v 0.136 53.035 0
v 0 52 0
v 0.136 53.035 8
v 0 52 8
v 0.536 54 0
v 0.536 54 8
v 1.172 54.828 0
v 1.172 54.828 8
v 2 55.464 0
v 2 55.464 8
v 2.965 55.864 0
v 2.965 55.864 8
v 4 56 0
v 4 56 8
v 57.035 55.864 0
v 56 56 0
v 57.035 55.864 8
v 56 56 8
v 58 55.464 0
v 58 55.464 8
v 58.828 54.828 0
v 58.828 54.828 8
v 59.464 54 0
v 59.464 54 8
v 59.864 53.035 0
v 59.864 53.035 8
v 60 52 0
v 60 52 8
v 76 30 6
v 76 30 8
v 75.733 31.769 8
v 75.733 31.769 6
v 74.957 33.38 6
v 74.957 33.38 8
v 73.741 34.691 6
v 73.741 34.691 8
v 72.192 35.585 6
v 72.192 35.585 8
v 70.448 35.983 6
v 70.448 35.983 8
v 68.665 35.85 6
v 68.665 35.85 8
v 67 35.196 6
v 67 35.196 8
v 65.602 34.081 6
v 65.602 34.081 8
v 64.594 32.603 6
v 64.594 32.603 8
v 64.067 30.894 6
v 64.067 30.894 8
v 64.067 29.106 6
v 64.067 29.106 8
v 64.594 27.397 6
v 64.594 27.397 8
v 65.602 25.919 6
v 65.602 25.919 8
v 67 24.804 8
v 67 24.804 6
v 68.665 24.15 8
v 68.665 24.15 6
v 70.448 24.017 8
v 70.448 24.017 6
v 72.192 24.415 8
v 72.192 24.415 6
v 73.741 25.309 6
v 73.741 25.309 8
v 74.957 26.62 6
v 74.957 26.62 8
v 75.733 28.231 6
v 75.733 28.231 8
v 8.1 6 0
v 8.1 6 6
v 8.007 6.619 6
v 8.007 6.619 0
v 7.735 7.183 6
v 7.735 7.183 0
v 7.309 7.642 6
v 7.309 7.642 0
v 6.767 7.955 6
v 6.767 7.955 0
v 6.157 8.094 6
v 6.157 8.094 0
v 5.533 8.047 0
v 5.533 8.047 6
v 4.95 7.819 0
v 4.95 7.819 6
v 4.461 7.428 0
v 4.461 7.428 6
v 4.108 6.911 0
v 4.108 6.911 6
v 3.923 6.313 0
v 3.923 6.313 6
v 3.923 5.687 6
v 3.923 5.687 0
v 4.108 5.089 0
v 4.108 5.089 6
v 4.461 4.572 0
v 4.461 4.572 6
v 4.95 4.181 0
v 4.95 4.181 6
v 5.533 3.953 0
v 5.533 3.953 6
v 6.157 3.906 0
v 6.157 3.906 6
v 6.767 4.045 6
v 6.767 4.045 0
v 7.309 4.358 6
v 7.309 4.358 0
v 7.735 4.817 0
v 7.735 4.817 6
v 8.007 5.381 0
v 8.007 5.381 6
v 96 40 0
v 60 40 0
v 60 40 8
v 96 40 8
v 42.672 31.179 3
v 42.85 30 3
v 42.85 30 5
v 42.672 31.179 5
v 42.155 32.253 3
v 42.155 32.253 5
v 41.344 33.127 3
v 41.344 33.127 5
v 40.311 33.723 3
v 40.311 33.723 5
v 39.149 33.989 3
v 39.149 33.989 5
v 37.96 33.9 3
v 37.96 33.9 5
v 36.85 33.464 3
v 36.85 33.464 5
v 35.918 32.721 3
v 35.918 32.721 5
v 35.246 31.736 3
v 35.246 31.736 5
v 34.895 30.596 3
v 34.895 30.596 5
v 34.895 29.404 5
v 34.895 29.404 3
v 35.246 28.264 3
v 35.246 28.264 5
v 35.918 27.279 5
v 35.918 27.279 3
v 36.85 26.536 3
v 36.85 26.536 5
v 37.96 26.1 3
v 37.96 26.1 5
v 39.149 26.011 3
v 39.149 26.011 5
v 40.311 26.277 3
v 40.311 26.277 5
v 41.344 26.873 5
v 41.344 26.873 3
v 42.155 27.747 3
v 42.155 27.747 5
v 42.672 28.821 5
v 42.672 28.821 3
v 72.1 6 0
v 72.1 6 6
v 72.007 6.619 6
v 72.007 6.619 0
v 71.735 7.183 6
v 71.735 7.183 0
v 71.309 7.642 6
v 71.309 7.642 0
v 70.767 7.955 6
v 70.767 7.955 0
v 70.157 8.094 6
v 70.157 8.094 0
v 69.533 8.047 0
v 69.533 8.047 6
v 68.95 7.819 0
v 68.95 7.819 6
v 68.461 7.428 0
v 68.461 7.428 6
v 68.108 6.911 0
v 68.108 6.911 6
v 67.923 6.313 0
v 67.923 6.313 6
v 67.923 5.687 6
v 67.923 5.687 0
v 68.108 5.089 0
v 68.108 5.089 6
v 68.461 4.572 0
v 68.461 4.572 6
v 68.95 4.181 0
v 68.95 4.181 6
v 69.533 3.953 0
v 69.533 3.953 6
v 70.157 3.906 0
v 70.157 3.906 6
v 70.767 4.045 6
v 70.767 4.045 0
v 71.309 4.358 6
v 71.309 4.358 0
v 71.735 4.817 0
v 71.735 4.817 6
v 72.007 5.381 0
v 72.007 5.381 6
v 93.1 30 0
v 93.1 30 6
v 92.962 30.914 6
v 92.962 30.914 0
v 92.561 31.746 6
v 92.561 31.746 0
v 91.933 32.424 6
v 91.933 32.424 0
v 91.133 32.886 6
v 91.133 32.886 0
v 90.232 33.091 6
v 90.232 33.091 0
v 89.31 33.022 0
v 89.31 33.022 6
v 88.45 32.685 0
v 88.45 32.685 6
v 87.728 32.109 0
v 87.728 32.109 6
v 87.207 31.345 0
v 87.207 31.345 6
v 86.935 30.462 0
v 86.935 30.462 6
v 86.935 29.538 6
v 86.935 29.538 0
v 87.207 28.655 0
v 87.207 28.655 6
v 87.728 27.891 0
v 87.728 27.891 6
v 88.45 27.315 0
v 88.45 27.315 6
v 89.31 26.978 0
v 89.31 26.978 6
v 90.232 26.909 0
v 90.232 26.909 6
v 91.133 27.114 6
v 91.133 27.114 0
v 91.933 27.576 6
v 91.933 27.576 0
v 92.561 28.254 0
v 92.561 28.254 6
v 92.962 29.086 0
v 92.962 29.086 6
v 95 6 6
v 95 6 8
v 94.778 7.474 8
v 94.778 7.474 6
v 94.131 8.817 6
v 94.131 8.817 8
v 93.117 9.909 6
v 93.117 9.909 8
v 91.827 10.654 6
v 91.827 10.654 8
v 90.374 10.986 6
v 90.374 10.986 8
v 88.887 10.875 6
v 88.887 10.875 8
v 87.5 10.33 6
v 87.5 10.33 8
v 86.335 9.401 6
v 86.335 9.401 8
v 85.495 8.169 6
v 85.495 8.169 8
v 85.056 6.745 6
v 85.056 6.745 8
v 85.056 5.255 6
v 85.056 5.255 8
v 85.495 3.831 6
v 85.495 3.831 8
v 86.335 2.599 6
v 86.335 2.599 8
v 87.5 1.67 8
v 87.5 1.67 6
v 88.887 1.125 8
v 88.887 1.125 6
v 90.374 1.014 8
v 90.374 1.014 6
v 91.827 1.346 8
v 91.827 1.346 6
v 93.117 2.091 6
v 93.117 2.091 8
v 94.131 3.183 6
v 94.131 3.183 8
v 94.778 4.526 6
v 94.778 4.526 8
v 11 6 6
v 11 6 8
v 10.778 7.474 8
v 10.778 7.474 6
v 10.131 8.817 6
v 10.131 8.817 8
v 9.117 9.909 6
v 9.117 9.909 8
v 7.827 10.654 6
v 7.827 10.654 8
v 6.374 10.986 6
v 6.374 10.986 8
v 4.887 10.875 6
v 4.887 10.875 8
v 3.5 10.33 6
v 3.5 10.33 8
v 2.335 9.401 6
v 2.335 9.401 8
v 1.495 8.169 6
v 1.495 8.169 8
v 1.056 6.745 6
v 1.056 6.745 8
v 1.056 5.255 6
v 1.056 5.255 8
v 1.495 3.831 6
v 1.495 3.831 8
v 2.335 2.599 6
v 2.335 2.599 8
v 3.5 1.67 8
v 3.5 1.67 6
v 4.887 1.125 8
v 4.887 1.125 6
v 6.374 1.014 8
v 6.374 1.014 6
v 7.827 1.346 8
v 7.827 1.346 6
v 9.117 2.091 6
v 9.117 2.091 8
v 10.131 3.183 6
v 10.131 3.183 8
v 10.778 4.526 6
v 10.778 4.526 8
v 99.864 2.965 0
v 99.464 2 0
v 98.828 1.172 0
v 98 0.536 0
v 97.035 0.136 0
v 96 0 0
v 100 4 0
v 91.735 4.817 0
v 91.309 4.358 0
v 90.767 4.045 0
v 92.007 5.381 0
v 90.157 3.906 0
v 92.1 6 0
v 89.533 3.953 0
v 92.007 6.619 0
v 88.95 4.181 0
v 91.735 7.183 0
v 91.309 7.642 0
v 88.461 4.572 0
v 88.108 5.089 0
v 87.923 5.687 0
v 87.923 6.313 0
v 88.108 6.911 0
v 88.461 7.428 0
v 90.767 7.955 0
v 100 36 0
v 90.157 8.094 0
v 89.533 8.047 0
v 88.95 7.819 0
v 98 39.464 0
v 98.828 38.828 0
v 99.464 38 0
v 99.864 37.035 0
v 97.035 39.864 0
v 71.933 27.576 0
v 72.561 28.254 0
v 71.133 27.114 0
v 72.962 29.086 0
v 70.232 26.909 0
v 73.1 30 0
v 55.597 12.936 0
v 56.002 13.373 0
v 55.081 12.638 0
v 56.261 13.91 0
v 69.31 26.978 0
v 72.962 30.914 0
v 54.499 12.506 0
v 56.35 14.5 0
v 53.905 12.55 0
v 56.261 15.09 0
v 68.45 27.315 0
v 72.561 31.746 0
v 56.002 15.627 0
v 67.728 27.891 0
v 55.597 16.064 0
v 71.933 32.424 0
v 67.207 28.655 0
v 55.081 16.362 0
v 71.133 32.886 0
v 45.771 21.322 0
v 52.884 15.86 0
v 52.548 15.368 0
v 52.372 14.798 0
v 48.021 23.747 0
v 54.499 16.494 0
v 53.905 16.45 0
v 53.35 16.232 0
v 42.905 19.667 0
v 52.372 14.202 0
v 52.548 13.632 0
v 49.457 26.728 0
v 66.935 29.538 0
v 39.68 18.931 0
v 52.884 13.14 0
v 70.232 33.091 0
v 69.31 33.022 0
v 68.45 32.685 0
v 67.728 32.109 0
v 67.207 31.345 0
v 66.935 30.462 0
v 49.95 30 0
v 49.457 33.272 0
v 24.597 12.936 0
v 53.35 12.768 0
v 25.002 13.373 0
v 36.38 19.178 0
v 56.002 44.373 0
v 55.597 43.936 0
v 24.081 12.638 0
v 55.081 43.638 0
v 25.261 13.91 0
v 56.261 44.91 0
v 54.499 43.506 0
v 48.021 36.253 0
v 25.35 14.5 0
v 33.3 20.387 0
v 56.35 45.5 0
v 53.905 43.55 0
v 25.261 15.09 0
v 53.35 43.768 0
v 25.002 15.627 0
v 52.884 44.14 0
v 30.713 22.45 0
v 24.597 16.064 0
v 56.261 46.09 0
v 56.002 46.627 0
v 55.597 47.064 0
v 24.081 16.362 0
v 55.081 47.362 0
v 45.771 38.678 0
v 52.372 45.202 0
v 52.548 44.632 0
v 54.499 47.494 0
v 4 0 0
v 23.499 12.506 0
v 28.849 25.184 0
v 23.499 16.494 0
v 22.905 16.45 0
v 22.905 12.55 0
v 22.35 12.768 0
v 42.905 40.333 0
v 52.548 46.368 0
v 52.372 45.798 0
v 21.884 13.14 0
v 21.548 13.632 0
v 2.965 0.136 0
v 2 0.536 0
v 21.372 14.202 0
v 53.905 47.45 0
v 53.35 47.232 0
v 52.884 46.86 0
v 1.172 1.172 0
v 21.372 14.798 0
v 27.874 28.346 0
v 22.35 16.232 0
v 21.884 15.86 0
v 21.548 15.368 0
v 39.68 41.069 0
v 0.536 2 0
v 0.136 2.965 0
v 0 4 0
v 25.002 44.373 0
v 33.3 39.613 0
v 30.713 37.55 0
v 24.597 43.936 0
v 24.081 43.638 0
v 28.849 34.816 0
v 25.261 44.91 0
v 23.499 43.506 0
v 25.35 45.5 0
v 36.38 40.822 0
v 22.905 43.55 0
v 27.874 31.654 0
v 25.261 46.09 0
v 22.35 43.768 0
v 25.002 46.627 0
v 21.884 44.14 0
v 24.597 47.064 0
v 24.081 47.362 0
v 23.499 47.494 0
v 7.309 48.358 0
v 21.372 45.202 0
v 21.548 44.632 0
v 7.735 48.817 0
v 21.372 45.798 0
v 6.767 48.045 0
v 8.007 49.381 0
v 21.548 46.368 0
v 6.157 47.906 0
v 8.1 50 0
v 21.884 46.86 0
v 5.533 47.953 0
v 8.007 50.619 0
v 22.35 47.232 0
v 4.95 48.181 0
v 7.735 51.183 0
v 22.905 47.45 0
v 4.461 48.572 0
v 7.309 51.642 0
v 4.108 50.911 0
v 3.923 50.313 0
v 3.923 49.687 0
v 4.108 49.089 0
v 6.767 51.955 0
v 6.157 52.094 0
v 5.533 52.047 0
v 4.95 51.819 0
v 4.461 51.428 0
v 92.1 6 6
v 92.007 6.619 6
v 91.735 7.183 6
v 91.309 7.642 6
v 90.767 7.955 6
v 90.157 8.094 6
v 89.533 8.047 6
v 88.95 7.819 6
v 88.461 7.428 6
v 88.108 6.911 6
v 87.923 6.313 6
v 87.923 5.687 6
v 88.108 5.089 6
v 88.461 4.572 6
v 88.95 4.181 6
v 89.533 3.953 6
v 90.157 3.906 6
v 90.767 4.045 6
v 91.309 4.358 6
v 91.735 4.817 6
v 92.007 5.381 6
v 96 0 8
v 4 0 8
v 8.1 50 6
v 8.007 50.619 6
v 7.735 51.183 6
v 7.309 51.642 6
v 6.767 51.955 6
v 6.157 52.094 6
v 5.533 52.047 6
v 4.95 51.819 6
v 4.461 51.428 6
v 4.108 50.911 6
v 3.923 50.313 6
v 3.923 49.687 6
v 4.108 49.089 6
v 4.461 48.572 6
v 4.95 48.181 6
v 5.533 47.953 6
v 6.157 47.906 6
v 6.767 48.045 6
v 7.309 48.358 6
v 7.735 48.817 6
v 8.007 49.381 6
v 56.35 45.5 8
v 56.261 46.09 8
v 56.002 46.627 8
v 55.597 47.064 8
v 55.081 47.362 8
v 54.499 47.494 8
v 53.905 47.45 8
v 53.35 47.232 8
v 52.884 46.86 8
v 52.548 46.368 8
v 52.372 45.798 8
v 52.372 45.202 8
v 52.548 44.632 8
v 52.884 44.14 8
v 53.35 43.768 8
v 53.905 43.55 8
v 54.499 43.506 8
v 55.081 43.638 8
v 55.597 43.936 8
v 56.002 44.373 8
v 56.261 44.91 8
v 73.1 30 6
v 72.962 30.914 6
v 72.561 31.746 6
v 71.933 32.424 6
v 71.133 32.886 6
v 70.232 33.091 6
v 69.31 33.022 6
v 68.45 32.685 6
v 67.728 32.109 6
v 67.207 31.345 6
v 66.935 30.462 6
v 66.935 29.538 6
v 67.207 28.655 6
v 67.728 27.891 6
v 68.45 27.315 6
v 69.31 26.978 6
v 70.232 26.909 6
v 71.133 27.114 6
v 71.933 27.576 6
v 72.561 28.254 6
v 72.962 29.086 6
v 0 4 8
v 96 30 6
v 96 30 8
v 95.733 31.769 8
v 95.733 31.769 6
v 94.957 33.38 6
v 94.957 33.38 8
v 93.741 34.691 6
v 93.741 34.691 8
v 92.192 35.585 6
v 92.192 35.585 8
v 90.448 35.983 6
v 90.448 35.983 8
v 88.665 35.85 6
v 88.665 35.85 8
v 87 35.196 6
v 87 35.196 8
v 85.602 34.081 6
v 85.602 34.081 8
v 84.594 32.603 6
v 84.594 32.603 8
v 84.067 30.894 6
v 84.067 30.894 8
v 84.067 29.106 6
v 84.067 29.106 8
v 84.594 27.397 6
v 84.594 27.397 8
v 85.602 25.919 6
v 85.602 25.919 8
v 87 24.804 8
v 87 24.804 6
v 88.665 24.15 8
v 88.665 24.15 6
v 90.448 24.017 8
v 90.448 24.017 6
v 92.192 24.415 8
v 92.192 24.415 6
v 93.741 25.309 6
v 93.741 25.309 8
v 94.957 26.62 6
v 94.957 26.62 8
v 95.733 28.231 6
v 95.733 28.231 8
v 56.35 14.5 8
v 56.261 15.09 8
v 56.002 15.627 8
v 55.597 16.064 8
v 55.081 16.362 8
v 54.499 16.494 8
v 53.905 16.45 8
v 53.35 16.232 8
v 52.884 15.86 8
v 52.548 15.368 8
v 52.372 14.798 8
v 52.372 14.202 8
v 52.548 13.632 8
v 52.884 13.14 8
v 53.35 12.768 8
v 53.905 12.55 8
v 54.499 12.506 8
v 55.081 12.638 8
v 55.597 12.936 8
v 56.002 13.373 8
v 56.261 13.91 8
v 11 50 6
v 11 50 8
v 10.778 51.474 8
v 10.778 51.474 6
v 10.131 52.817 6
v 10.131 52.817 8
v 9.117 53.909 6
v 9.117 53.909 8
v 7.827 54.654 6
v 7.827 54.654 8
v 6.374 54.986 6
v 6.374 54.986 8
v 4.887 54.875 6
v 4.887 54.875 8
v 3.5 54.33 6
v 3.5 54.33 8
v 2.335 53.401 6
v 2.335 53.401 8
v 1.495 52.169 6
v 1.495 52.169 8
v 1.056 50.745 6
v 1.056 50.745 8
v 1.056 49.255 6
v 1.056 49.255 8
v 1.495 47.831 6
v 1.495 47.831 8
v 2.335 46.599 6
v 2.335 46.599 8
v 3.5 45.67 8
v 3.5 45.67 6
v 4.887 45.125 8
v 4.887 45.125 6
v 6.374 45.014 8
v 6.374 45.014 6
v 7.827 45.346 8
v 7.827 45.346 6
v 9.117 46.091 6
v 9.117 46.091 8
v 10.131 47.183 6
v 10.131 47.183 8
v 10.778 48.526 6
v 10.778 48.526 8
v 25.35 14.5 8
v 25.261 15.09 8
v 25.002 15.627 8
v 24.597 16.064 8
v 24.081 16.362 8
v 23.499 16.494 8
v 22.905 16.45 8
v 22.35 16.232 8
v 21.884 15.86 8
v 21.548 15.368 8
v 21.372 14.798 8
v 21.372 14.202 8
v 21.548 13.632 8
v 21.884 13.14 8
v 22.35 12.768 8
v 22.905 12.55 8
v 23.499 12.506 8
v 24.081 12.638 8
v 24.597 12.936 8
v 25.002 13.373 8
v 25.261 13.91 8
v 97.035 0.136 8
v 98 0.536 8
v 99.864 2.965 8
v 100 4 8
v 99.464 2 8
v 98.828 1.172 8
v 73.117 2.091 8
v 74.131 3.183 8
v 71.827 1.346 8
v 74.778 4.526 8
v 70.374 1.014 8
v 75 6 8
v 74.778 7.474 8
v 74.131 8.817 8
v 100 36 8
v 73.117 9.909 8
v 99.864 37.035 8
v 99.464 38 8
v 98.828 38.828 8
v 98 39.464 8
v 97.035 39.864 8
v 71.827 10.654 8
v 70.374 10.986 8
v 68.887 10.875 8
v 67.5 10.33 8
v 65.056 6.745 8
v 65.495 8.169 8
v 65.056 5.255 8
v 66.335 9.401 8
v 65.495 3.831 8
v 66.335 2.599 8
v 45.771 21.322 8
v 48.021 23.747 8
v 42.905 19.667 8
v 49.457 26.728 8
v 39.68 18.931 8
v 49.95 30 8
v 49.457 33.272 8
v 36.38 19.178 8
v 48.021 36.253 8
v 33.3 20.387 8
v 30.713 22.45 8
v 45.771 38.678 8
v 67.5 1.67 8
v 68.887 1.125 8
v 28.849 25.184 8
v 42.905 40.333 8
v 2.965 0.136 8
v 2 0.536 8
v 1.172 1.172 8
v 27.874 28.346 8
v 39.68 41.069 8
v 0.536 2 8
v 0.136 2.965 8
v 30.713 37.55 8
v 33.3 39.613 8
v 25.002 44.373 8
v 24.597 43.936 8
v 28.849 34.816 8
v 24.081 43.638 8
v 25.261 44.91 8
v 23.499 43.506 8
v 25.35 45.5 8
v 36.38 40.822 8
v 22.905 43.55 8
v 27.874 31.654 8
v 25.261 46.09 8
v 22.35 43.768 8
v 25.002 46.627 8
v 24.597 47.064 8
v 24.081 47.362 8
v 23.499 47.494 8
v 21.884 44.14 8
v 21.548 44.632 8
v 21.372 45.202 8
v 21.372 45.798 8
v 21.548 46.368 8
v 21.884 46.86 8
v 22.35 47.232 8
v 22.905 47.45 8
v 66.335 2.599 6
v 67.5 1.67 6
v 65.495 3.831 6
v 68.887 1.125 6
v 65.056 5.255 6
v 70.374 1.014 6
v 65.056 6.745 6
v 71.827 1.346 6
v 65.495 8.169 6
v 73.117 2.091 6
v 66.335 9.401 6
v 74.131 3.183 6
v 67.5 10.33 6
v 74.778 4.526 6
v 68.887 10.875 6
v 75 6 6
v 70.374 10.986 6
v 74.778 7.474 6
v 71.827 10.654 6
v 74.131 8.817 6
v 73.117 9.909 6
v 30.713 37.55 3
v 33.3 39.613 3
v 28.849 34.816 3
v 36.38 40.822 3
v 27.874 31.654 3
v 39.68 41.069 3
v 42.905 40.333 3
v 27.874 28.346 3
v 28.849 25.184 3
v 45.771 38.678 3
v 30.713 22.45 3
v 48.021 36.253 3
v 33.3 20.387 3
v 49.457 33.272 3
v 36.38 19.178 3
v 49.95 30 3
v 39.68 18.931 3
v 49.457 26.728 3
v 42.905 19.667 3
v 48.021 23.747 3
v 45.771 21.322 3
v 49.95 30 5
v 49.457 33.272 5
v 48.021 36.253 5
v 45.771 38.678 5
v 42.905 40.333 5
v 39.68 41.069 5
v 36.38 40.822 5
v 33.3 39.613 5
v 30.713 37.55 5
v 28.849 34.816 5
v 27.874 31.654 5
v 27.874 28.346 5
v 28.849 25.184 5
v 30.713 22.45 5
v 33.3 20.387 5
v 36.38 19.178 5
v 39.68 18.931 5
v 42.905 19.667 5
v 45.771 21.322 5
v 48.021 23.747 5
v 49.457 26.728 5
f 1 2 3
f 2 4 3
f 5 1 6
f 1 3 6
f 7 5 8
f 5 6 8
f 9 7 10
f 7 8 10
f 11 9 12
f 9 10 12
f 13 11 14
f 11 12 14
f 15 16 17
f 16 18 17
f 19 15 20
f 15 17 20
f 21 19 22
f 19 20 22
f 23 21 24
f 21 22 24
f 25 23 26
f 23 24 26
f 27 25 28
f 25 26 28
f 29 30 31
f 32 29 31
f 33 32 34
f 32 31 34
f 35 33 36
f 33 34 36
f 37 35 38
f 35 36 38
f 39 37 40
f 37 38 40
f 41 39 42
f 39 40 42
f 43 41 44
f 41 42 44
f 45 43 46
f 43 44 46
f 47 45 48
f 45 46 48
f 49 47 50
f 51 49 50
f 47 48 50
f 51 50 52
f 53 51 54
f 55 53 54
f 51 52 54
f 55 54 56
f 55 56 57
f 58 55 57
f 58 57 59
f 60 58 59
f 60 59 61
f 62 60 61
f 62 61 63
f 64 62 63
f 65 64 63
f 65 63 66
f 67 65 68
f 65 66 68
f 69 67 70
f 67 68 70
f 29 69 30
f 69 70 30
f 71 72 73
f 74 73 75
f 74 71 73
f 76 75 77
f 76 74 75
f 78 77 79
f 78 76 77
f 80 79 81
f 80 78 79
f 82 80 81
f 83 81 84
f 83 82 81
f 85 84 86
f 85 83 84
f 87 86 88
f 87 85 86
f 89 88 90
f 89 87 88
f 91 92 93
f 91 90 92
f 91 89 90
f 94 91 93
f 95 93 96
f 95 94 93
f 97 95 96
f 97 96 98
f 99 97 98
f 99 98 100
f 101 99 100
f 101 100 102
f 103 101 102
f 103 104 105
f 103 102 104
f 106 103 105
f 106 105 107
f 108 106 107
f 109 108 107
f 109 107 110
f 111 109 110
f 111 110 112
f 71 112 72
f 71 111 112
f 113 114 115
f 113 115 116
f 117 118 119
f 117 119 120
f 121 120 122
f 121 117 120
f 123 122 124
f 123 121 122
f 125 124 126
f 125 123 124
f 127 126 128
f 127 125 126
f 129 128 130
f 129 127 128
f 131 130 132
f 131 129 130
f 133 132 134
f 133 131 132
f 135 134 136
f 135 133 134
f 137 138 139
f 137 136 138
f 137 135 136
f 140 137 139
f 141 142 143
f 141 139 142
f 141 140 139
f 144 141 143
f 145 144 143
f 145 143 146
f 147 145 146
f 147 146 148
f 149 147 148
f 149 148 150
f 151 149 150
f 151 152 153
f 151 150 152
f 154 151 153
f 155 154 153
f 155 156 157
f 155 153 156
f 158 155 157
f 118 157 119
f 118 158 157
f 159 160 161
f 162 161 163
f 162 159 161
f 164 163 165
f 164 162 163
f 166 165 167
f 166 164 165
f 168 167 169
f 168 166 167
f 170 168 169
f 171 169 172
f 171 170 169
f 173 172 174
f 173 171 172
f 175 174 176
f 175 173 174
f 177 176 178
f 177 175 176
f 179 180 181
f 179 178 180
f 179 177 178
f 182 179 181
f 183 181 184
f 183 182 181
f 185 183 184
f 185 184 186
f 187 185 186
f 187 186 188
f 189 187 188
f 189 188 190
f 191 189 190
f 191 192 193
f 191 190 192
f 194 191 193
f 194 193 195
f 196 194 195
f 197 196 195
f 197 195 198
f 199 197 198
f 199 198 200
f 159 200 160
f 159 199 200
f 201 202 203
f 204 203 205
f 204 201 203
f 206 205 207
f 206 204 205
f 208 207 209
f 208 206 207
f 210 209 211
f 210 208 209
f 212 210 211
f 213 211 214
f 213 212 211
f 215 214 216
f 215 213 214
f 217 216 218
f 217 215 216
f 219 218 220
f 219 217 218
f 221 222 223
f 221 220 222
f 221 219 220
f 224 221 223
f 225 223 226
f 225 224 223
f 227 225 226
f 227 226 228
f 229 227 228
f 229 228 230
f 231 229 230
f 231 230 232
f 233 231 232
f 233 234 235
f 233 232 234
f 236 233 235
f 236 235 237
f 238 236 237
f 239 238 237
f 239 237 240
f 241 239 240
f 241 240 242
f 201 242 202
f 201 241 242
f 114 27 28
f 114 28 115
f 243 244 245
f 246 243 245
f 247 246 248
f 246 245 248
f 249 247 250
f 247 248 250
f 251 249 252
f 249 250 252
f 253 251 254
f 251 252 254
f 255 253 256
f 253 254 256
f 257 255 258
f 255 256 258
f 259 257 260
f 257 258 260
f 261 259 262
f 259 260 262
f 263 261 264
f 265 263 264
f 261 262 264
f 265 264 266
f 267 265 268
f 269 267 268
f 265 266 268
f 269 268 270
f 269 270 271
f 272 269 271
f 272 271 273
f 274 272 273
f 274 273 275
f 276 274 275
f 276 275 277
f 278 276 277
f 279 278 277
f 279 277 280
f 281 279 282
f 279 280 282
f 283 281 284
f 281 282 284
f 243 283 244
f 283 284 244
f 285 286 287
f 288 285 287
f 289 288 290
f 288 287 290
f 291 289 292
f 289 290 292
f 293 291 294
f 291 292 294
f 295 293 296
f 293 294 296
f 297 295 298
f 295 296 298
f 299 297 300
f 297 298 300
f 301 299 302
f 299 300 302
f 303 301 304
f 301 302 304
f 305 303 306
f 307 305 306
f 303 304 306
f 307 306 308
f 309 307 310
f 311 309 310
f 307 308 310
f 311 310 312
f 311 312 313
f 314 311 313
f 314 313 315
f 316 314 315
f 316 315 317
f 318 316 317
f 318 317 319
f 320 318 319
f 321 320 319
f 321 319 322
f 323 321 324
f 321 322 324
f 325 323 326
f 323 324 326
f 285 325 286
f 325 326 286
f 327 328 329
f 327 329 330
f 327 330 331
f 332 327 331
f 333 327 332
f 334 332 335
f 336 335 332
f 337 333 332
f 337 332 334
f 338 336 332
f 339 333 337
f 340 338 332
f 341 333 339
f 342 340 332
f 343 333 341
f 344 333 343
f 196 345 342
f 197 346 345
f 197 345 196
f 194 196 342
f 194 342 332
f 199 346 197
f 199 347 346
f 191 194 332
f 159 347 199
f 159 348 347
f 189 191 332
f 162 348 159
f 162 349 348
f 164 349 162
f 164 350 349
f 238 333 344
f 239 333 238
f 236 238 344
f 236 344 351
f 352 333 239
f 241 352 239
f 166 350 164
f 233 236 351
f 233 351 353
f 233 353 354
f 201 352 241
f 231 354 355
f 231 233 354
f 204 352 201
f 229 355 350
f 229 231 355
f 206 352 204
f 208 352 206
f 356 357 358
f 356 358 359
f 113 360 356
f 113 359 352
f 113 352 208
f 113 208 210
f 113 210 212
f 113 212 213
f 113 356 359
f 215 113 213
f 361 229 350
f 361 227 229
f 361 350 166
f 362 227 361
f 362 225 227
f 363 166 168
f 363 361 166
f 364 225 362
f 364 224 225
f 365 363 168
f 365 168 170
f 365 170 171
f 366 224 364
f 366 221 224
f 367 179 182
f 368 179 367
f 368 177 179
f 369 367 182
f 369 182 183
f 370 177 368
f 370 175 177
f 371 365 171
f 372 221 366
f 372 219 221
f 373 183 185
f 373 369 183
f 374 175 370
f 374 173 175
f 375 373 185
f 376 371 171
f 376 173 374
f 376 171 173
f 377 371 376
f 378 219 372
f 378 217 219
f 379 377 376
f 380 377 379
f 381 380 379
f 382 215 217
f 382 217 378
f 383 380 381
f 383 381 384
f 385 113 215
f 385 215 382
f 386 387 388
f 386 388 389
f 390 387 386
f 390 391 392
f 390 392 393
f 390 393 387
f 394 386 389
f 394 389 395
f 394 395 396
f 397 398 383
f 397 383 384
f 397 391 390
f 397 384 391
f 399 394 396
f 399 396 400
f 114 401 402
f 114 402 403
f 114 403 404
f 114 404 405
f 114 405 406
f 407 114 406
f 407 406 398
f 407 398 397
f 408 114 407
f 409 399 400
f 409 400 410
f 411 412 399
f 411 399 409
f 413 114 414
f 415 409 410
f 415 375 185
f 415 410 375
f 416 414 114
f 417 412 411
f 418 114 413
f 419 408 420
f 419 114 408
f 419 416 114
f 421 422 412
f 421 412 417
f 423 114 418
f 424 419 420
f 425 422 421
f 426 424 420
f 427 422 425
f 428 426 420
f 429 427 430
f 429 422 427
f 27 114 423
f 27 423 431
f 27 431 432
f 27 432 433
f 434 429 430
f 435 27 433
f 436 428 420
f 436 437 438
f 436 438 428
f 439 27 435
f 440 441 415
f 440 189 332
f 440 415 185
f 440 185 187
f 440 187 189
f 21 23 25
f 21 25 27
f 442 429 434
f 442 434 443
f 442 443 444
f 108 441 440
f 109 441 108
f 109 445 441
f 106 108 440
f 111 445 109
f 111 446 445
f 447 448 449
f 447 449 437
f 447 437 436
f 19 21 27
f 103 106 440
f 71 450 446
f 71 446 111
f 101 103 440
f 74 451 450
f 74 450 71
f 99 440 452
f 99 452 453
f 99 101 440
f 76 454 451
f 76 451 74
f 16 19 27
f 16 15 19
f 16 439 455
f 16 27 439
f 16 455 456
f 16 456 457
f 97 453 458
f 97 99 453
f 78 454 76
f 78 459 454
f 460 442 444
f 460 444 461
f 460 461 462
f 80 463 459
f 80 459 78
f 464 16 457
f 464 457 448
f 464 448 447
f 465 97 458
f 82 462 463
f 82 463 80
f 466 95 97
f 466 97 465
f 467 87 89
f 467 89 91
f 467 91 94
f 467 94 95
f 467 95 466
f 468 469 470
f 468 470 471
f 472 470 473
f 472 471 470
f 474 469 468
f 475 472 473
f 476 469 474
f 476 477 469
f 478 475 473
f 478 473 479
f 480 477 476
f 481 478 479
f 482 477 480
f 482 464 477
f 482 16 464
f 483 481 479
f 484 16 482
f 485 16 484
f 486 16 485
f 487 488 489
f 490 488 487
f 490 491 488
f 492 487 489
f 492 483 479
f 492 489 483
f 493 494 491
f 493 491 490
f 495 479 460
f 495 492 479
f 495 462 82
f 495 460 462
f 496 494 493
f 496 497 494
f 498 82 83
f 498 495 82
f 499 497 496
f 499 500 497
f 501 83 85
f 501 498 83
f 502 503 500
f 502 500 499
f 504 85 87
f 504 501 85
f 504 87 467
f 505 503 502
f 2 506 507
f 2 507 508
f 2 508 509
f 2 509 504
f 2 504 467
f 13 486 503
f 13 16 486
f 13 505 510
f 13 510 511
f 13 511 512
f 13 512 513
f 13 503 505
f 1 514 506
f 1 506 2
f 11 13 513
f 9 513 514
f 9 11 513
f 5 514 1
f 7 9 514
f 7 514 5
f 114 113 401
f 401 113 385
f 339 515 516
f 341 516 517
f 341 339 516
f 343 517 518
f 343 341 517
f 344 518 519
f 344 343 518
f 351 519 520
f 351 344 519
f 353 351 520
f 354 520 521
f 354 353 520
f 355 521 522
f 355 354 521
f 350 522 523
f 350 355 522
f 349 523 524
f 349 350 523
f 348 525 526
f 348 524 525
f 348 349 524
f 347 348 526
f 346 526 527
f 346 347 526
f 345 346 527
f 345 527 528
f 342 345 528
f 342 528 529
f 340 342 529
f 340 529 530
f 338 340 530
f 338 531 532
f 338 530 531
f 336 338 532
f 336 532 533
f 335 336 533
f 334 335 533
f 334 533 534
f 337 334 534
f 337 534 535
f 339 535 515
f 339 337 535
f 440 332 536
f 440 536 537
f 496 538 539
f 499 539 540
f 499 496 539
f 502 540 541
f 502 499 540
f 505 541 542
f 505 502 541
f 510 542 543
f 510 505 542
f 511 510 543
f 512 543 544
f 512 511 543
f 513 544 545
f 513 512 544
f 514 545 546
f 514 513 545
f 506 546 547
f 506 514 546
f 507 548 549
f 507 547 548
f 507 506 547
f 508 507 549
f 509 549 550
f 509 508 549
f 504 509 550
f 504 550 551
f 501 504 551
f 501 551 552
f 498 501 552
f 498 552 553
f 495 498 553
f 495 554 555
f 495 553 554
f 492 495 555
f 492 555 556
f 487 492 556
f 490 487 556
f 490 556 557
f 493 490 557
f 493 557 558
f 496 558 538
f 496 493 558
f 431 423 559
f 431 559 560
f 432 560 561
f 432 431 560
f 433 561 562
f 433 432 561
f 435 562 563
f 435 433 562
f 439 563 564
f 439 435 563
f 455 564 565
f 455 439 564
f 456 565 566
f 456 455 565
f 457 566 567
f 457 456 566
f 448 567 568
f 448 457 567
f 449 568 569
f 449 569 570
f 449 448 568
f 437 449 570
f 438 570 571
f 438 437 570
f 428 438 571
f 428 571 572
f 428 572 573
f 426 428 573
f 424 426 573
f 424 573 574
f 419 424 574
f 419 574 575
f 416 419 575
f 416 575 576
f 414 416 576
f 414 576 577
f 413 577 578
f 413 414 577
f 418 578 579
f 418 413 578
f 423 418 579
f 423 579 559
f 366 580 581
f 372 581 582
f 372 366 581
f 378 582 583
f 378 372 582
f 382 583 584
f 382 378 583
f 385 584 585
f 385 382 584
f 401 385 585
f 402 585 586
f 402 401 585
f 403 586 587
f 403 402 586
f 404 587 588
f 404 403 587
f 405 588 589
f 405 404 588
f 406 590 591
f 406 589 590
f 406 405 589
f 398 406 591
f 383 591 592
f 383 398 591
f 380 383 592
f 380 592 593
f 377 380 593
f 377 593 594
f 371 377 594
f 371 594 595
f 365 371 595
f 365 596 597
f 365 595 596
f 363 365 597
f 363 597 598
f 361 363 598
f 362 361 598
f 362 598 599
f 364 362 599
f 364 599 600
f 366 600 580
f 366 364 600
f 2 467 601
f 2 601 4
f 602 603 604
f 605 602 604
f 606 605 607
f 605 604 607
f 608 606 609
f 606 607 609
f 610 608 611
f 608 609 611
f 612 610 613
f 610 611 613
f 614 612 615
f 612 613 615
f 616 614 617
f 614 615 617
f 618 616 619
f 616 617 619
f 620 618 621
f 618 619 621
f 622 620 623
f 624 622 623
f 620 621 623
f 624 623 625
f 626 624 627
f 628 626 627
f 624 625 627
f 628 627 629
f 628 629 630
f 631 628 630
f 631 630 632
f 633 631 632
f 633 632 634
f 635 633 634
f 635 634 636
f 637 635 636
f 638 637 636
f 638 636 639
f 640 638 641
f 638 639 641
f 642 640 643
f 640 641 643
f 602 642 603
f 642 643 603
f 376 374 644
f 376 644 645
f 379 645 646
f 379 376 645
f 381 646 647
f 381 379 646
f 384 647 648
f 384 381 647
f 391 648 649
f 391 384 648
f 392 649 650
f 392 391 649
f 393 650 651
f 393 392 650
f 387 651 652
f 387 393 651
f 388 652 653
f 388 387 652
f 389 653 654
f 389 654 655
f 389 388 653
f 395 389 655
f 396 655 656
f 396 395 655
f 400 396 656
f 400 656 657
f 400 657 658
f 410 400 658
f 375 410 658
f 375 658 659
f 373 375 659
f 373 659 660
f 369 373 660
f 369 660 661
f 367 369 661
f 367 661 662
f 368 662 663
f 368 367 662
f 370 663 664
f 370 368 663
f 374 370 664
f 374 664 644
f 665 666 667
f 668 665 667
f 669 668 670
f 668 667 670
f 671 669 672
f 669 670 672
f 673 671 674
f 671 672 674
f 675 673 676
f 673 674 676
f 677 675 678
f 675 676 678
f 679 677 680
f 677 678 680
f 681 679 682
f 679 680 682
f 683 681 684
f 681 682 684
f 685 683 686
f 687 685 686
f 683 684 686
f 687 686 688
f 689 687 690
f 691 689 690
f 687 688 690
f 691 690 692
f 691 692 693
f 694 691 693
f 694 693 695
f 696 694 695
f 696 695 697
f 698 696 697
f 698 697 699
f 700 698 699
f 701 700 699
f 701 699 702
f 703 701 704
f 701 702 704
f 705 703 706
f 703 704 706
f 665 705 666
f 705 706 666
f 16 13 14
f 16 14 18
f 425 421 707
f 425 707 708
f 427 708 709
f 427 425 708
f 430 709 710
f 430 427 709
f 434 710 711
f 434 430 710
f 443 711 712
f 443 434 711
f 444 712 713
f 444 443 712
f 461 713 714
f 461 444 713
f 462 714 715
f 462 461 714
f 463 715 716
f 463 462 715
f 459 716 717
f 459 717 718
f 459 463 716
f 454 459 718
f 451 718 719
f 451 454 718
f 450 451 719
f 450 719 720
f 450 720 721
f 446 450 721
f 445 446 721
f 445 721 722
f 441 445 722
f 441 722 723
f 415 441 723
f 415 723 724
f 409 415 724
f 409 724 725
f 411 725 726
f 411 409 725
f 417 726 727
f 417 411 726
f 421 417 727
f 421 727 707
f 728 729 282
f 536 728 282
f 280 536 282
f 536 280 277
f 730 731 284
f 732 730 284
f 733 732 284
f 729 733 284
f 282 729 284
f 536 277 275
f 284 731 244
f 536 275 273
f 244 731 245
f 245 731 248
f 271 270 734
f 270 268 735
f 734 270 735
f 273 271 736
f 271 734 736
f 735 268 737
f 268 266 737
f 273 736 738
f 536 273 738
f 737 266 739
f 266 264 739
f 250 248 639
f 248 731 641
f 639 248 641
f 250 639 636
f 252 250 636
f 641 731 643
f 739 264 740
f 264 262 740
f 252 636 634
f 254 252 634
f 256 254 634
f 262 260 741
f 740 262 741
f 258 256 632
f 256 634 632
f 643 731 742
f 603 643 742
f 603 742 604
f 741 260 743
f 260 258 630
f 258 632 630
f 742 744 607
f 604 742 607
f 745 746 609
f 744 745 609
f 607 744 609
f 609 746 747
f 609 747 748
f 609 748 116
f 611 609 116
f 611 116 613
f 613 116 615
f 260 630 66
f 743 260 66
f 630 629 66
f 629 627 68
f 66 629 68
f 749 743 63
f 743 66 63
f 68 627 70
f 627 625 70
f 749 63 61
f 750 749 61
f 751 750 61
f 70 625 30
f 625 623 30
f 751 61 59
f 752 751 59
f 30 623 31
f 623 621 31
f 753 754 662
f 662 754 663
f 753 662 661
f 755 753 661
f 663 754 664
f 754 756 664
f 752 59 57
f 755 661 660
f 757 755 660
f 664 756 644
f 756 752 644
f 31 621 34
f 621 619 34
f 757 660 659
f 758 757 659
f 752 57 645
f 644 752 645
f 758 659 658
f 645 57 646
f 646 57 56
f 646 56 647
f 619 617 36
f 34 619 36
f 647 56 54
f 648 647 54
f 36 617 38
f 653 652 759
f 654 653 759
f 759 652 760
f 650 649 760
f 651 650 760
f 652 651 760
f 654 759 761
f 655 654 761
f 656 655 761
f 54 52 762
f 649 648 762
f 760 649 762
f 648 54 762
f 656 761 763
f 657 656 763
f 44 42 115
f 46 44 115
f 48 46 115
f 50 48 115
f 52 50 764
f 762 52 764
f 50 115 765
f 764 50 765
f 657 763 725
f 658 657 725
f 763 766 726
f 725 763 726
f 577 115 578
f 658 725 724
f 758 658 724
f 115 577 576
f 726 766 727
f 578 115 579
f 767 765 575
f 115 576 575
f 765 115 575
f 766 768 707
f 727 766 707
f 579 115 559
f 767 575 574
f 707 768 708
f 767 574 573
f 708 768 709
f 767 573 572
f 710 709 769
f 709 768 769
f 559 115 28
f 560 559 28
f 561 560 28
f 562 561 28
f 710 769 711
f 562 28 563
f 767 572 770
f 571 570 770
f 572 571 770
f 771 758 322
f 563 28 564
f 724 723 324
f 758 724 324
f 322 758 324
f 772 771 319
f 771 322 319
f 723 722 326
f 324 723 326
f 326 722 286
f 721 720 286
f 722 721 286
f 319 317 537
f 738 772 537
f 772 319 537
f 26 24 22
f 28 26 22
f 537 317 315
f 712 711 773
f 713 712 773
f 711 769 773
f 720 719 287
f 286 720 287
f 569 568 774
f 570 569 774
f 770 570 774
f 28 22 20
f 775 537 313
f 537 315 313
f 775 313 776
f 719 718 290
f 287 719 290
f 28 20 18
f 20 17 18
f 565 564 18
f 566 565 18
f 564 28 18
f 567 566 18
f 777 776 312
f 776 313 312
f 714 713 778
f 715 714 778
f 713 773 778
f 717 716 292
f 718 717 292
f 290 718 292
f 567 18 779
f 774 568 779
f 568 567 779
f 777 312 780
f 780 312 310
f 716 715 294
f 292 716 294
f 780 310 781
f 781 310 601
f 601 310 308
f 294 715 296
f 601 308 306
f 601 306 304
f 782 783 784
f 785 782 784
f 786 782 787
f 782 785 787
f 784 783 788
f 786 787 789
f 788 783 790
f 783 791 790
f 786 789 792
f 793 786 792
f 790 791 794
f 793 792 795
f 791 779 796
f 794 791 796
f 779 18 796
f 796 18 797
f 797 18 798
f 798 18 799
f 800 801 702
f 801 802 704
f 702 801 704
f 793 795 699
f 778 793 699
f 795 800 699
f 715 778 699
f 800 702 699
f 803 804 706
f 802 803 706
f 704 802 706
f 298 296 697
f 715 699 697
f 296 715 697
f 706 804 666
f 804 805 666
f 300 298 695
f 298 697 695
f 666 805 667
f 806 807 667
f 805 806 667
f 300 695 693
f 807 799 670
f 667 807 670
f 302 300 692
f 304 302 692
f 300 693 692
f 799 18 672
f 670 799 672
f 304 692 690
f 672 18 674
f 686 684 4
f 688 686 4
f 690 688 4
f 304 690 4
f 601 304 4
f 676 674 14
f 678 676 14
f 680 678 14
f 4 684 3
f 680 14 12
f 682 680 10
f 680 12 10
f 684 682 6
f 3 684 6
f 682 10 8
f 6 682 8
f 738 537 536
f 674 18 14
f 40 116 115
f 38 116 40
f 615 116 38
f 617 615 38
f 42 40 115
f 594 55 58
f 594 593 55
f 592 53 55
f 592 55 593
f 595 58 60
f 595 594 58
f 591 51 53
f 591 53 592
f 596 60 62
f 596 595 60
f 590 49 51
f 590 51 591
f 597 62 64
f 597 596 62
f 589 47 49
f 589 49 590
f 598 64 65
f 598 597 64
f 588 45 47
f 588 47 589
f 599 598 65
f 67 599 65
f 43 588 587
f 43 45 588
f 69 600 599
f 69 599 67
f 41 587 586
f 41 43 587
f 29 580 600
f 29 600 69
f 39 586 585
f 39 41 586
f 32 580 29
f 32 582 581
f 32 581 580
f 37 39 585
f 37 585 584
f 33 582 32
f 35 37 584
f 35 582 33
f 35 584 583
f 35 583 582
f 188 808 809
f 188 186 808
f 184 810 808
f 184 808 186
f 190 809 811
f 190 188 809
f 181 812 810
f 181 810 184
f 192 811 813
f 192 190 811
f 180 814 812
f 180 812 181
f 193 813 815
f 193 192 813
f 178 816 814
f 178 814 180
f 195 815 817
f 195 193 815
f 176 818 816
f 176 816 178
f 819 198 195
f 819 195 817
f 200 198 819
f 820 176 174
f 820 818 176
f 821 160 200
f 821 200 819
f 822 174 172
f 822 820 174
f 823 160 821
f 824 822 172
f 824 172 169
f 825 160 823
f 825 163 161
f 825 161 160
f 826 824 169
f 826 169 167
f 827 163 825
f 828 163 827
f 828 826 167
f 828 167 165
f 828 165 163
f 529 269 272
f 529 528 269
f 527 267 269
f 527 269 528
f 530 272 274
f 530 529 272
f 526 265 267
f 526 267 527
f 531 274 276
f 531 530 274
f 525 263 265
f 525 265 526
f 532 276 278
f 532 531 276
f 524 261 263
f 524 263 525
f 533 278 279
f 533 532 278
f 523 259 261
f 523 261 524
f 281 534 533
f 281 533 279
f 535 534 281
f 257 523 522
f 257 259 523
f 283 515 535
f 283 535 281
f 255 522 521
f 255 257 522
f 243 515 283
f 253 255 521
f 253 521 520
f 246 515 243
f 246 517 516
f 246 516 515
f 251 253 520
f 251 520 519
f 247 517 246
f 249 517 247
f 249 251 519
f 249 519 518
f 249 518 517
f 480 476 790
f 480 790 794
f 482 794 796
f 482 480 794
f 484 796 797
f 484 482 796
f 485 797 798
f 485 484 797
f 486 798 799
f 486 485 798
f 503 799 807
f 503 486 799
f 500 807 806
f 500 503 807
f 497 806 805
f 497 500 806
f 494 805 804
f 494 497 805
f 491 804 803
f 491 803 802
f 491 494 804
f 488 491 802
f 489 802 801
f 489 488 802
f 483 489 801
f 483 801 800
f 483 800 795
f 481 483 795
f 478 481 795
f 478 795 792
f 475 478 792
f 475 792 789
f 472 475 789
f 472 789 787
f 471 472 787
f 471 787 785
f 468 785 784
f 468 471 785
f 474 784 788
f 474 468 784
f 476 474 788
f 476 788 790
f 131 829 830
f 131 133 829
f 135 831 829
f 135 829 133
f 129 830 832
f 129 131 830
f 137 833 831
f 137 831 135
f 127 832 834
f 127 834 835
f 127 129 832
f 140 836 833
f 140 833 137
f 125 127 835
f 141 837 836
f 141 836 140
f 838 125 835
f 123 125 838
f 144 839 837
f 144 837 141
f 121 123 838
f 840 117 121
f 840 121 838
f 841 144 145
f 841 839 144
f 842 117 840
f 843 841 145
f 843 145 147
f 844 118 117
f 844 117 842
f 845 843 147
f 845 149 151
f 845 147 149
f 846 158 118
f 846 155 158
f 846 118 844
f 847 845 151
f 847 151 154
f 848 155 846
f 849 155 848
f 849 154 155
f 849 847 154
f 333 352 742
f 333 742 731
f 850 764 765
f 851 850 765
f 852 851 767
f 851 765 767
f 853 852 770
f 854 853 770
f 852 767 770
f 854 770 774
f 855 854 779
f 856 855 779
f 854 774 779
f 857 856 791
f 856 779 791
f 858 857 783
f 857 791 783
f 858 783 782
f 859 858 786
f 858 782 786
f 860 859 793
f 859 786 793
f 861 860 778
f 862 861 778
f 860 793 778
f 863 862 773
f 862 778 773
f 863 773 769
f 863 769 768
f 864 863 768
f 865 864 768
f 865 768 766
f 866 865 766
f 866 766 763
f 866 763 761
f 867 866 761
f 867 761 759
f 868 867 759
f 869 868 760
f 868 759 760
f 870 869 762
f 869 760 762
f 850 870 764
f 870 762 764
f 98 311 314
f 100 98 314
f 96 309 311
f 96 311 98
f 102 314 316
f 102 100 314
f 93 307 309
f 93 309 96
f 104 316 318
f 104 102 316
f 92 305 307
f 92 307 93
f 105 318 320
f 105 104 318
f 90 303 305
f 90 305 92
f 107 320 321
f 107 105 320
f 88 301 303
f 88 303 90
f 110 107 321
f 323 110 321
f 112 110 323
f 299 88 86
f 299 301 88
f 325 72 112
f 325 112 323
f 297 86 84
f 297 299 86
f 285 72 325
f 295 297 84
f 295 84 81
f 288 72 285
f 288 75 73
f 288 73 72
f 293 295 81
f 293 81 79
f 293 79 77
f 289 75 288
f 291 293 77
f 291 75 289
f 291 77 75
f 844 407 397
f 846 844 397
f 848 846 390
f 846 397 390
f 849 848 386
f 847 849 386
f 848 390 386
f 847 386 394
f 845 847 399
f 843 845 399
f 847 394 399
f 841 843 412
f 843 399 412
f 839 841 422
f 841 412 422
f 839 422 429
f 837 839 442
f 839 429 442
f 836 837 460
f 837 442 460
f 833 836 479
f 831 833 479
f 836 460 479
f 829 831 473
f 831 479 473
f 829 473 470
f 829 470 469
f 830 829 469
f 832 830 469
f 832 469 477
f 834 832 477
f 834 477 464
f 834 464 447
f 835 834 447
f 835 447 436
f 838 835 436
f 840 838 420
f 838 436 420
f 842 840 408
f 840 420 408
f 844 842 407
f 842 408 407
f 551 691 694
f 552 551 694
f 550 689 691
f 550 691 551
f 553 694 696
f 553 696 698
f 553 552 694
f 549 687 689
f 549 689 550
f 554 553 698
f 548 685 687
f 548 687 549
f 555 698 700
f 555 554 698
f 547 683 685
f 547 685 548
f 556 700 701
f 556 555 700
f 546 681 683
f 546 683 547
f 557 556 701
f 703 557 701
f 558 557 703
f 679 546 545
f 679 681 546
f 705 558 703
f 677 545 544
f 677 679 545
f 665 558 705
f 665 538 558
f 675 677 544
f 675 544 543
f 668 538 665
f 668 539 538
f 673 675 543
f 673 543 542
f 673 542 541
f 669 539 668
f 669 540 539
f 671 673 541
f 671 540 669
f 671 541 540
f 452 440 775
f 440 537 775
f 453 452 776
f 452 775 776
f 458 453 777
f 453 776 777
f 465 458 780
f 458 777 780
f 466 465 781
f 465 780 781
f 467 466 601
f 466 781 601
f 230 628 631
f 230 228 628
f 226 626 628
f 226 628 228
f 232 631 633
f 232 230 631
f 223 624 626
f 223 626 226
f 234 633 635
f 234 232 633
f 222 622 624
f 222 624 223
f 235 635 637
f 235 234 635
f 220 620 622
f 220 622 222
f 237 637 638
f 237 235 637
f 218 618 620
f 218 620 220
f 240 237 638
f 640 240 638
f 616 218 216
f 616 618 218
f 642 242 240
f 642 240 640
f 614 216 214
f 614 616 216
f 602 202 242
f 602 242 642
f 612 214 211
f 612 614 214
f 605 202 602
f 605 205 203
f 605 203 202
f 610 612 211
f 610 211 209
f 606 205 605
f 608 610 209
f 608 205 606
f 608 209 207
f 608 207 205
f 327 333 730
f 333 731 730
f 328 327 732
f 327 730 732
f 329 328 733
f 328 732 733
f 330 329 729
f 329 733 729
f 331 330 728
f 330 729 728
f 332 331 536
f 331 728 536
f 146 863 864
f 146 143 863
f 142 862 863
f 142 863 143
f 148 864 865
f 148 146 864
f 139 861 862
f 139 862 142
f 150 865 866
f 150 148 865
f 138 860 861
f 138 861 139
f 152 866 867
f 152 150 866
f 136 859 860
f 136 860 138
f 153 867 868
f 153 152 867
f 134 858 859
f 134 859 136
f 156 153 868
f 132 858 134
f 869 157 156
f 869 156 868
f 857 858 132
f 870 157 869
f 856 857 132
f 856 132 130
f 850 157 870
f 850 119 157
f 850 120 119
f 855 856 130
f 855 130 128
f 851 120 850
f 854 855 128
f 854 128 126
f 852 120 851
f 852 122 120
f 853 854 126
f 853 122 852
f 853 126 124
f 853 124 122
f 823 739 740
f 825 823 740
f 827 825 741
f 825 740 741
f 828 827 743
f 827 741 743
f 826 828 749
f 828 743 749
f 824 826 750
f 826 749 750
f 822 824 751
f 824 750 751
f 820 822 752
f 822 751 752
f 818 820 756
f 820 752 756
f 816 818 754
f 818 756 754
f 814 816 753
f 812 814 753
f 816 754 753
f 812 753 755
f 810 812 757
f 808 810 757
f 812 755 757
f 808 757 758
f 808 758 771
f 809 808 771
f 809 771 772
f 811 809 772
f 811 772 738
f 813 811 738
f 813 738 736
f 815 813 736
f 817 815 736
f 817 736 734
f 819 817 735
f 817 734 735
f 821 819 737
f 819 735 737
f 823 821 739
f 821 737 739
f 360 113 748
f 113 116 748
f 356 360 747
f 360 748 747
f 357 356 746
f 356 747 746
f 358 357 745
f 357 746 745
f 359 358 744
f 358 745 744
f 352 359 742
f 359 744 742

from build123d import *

# Parameters (mm, degrees)
SKETCH_R        = 3.1
SKETCH_R_2      = 4
SKETCH_R_3      = 2
SKETCH_R_4      = 2.1
PAD_DEPTH       = 8
SKETCH001_R     = 11.1
POCKET_DEPTH    = 3
SKETCH002_R     = 5
SKETCH002_R_2   = 6
POCKET001_DEPTH = 2
SKETCH003_R     = 11.1
POCKET002_DEPTH = 3
FILLET_R        = 4
FILLET001_R     = 4
FILLET002_R     = 4
FILLET003_R     = 4
FILLET004_R     = 4


with BuildPart() as part:
    # Sketch → Pad (new body)
    with BuildSketch(Plane.XY):
        Polygon((0, 0), (0, 56), (60, 56), (60, 40), (100, 40), (100, 0), align=None)
        with Locations((90, 30)):
            Circle(SKETCH_R, mode=Mode.SUBTRACT)
        with Locations((70, 30)):
            Circle(SKETCH_R, mode=Mode.SUBTRACT)
        with Locations((38.85, 30)):
            Circle(SKETCH_R_2, mode=Mode.SUBTRACT)
        with Locations((23.35, 45.5)):
            Circle(SKETCH_R_3, mode=Mode.SUBTRACT)
        with Locations((23.35, 14.5)):
            Circle(SKETCH_R_3, mode=Mode.SUBTRACT)
        with Locations((54.35, 14.5)):
            Circle(SKETCH_R_3, mode=Mode.SUBTRACT)
        with Locations((54.35, 45.5)):
            Circle(SKETCH_R_3, mode=Mode.SUBTRACT)
        with Locations((6, 6)):
            Circle(SKETCH_R_4, mode=Mode.SUBTRACT)
        with Locations((6, 50)):
            Circle(SKETCH_R_4, mode=Mode.SUBTRACT)
        with Locations((90, 6)):
            Circle(SKETCH_R_4, mode=Mode.SUBTRACT)
        with Locations((70, 6)):
            Circle(SKETCH_R_4, mode=Mode.SUBTRACT)
    extrude(amount=PAD_DEPTH)

    # Sketch001 → Pocket (cut)
    with BuildSketch(Plane.XY.offset(8)):
        with Locations((38.85, 30)):
            Circle(SKETCH001_R)
    extrude(amount=-POCKET_DEPTH, mode=Mode.SUBTRACT)

    # Sketch002 → Pocket001 (cut)
    with BuildSketch(Plane.XY.offset(8)):
        with Locations((6, 50)):
            Circle(SKETCH002_R)
        with Locations((6, 6)):
            Circle(SKETCH002_R)
        with Locations((70, 6)):
            Circle(SKETCH002_R)
        with Locations((90, 6)):
            Circle(SKETCH002_R)
        with Locations((70, 30)):
            Circle(SKETCH002_R_2)
        with Locations((90, 30)):
            Circle(SKETCH002_R_2)
    extrude(amount=-POCKET001_DEPTH, mode=Mode.SUBTRACT)

    # Sketch003 → Pocket002 (cut)
    with BuildSketch(Plane(origin=(0, 0, 0), x_dir=(1, 0, 0), z_dir=(0, 0, -1))):
        with Locations((38.85, -30)):
            Circle(SKETCH003_R)
    extrude(amount=-POCKET002_DEPTH, mode=Mode.SUBTRACT)

    # Fillet
    fillet_edges = [part.edges().sort_by_distance(p)[0] for p in [
        (0, 56, 4),
    ]]
    fillet(fillet_edges, radius=FILLET_R)

    # Fillet001
    fillet001_edges = [part.edges().sort_by_distance(p)[0] for p in [
        (60, 56, 4),
    ]]
    fillet(fillet001_edges, radius=FILLET001_R)

    # Fillet002
    fillet002_edges = [part.edges().sort_by_distance(p)[0] for p in [
        (100, 40, 4),
    ]]
    fillet(fillet002_edges, radius=FILLET002_R)

    # Fillet003
    fillet003_edges = [part.edges().sort_by_distance(p)[0] for p in [
        (100, 0, 4),
    ]]
    fillet(fillet003_edges, radius=FILLET003_R)

    # Fillet004
    fillet004_edges = [part.edges().sort_by_distance(p)[0] for p in [
        (0, 0, 4),
    ]]
    fillet(fillet004_edges, radius=FILLET004_R)


solid = part.part
